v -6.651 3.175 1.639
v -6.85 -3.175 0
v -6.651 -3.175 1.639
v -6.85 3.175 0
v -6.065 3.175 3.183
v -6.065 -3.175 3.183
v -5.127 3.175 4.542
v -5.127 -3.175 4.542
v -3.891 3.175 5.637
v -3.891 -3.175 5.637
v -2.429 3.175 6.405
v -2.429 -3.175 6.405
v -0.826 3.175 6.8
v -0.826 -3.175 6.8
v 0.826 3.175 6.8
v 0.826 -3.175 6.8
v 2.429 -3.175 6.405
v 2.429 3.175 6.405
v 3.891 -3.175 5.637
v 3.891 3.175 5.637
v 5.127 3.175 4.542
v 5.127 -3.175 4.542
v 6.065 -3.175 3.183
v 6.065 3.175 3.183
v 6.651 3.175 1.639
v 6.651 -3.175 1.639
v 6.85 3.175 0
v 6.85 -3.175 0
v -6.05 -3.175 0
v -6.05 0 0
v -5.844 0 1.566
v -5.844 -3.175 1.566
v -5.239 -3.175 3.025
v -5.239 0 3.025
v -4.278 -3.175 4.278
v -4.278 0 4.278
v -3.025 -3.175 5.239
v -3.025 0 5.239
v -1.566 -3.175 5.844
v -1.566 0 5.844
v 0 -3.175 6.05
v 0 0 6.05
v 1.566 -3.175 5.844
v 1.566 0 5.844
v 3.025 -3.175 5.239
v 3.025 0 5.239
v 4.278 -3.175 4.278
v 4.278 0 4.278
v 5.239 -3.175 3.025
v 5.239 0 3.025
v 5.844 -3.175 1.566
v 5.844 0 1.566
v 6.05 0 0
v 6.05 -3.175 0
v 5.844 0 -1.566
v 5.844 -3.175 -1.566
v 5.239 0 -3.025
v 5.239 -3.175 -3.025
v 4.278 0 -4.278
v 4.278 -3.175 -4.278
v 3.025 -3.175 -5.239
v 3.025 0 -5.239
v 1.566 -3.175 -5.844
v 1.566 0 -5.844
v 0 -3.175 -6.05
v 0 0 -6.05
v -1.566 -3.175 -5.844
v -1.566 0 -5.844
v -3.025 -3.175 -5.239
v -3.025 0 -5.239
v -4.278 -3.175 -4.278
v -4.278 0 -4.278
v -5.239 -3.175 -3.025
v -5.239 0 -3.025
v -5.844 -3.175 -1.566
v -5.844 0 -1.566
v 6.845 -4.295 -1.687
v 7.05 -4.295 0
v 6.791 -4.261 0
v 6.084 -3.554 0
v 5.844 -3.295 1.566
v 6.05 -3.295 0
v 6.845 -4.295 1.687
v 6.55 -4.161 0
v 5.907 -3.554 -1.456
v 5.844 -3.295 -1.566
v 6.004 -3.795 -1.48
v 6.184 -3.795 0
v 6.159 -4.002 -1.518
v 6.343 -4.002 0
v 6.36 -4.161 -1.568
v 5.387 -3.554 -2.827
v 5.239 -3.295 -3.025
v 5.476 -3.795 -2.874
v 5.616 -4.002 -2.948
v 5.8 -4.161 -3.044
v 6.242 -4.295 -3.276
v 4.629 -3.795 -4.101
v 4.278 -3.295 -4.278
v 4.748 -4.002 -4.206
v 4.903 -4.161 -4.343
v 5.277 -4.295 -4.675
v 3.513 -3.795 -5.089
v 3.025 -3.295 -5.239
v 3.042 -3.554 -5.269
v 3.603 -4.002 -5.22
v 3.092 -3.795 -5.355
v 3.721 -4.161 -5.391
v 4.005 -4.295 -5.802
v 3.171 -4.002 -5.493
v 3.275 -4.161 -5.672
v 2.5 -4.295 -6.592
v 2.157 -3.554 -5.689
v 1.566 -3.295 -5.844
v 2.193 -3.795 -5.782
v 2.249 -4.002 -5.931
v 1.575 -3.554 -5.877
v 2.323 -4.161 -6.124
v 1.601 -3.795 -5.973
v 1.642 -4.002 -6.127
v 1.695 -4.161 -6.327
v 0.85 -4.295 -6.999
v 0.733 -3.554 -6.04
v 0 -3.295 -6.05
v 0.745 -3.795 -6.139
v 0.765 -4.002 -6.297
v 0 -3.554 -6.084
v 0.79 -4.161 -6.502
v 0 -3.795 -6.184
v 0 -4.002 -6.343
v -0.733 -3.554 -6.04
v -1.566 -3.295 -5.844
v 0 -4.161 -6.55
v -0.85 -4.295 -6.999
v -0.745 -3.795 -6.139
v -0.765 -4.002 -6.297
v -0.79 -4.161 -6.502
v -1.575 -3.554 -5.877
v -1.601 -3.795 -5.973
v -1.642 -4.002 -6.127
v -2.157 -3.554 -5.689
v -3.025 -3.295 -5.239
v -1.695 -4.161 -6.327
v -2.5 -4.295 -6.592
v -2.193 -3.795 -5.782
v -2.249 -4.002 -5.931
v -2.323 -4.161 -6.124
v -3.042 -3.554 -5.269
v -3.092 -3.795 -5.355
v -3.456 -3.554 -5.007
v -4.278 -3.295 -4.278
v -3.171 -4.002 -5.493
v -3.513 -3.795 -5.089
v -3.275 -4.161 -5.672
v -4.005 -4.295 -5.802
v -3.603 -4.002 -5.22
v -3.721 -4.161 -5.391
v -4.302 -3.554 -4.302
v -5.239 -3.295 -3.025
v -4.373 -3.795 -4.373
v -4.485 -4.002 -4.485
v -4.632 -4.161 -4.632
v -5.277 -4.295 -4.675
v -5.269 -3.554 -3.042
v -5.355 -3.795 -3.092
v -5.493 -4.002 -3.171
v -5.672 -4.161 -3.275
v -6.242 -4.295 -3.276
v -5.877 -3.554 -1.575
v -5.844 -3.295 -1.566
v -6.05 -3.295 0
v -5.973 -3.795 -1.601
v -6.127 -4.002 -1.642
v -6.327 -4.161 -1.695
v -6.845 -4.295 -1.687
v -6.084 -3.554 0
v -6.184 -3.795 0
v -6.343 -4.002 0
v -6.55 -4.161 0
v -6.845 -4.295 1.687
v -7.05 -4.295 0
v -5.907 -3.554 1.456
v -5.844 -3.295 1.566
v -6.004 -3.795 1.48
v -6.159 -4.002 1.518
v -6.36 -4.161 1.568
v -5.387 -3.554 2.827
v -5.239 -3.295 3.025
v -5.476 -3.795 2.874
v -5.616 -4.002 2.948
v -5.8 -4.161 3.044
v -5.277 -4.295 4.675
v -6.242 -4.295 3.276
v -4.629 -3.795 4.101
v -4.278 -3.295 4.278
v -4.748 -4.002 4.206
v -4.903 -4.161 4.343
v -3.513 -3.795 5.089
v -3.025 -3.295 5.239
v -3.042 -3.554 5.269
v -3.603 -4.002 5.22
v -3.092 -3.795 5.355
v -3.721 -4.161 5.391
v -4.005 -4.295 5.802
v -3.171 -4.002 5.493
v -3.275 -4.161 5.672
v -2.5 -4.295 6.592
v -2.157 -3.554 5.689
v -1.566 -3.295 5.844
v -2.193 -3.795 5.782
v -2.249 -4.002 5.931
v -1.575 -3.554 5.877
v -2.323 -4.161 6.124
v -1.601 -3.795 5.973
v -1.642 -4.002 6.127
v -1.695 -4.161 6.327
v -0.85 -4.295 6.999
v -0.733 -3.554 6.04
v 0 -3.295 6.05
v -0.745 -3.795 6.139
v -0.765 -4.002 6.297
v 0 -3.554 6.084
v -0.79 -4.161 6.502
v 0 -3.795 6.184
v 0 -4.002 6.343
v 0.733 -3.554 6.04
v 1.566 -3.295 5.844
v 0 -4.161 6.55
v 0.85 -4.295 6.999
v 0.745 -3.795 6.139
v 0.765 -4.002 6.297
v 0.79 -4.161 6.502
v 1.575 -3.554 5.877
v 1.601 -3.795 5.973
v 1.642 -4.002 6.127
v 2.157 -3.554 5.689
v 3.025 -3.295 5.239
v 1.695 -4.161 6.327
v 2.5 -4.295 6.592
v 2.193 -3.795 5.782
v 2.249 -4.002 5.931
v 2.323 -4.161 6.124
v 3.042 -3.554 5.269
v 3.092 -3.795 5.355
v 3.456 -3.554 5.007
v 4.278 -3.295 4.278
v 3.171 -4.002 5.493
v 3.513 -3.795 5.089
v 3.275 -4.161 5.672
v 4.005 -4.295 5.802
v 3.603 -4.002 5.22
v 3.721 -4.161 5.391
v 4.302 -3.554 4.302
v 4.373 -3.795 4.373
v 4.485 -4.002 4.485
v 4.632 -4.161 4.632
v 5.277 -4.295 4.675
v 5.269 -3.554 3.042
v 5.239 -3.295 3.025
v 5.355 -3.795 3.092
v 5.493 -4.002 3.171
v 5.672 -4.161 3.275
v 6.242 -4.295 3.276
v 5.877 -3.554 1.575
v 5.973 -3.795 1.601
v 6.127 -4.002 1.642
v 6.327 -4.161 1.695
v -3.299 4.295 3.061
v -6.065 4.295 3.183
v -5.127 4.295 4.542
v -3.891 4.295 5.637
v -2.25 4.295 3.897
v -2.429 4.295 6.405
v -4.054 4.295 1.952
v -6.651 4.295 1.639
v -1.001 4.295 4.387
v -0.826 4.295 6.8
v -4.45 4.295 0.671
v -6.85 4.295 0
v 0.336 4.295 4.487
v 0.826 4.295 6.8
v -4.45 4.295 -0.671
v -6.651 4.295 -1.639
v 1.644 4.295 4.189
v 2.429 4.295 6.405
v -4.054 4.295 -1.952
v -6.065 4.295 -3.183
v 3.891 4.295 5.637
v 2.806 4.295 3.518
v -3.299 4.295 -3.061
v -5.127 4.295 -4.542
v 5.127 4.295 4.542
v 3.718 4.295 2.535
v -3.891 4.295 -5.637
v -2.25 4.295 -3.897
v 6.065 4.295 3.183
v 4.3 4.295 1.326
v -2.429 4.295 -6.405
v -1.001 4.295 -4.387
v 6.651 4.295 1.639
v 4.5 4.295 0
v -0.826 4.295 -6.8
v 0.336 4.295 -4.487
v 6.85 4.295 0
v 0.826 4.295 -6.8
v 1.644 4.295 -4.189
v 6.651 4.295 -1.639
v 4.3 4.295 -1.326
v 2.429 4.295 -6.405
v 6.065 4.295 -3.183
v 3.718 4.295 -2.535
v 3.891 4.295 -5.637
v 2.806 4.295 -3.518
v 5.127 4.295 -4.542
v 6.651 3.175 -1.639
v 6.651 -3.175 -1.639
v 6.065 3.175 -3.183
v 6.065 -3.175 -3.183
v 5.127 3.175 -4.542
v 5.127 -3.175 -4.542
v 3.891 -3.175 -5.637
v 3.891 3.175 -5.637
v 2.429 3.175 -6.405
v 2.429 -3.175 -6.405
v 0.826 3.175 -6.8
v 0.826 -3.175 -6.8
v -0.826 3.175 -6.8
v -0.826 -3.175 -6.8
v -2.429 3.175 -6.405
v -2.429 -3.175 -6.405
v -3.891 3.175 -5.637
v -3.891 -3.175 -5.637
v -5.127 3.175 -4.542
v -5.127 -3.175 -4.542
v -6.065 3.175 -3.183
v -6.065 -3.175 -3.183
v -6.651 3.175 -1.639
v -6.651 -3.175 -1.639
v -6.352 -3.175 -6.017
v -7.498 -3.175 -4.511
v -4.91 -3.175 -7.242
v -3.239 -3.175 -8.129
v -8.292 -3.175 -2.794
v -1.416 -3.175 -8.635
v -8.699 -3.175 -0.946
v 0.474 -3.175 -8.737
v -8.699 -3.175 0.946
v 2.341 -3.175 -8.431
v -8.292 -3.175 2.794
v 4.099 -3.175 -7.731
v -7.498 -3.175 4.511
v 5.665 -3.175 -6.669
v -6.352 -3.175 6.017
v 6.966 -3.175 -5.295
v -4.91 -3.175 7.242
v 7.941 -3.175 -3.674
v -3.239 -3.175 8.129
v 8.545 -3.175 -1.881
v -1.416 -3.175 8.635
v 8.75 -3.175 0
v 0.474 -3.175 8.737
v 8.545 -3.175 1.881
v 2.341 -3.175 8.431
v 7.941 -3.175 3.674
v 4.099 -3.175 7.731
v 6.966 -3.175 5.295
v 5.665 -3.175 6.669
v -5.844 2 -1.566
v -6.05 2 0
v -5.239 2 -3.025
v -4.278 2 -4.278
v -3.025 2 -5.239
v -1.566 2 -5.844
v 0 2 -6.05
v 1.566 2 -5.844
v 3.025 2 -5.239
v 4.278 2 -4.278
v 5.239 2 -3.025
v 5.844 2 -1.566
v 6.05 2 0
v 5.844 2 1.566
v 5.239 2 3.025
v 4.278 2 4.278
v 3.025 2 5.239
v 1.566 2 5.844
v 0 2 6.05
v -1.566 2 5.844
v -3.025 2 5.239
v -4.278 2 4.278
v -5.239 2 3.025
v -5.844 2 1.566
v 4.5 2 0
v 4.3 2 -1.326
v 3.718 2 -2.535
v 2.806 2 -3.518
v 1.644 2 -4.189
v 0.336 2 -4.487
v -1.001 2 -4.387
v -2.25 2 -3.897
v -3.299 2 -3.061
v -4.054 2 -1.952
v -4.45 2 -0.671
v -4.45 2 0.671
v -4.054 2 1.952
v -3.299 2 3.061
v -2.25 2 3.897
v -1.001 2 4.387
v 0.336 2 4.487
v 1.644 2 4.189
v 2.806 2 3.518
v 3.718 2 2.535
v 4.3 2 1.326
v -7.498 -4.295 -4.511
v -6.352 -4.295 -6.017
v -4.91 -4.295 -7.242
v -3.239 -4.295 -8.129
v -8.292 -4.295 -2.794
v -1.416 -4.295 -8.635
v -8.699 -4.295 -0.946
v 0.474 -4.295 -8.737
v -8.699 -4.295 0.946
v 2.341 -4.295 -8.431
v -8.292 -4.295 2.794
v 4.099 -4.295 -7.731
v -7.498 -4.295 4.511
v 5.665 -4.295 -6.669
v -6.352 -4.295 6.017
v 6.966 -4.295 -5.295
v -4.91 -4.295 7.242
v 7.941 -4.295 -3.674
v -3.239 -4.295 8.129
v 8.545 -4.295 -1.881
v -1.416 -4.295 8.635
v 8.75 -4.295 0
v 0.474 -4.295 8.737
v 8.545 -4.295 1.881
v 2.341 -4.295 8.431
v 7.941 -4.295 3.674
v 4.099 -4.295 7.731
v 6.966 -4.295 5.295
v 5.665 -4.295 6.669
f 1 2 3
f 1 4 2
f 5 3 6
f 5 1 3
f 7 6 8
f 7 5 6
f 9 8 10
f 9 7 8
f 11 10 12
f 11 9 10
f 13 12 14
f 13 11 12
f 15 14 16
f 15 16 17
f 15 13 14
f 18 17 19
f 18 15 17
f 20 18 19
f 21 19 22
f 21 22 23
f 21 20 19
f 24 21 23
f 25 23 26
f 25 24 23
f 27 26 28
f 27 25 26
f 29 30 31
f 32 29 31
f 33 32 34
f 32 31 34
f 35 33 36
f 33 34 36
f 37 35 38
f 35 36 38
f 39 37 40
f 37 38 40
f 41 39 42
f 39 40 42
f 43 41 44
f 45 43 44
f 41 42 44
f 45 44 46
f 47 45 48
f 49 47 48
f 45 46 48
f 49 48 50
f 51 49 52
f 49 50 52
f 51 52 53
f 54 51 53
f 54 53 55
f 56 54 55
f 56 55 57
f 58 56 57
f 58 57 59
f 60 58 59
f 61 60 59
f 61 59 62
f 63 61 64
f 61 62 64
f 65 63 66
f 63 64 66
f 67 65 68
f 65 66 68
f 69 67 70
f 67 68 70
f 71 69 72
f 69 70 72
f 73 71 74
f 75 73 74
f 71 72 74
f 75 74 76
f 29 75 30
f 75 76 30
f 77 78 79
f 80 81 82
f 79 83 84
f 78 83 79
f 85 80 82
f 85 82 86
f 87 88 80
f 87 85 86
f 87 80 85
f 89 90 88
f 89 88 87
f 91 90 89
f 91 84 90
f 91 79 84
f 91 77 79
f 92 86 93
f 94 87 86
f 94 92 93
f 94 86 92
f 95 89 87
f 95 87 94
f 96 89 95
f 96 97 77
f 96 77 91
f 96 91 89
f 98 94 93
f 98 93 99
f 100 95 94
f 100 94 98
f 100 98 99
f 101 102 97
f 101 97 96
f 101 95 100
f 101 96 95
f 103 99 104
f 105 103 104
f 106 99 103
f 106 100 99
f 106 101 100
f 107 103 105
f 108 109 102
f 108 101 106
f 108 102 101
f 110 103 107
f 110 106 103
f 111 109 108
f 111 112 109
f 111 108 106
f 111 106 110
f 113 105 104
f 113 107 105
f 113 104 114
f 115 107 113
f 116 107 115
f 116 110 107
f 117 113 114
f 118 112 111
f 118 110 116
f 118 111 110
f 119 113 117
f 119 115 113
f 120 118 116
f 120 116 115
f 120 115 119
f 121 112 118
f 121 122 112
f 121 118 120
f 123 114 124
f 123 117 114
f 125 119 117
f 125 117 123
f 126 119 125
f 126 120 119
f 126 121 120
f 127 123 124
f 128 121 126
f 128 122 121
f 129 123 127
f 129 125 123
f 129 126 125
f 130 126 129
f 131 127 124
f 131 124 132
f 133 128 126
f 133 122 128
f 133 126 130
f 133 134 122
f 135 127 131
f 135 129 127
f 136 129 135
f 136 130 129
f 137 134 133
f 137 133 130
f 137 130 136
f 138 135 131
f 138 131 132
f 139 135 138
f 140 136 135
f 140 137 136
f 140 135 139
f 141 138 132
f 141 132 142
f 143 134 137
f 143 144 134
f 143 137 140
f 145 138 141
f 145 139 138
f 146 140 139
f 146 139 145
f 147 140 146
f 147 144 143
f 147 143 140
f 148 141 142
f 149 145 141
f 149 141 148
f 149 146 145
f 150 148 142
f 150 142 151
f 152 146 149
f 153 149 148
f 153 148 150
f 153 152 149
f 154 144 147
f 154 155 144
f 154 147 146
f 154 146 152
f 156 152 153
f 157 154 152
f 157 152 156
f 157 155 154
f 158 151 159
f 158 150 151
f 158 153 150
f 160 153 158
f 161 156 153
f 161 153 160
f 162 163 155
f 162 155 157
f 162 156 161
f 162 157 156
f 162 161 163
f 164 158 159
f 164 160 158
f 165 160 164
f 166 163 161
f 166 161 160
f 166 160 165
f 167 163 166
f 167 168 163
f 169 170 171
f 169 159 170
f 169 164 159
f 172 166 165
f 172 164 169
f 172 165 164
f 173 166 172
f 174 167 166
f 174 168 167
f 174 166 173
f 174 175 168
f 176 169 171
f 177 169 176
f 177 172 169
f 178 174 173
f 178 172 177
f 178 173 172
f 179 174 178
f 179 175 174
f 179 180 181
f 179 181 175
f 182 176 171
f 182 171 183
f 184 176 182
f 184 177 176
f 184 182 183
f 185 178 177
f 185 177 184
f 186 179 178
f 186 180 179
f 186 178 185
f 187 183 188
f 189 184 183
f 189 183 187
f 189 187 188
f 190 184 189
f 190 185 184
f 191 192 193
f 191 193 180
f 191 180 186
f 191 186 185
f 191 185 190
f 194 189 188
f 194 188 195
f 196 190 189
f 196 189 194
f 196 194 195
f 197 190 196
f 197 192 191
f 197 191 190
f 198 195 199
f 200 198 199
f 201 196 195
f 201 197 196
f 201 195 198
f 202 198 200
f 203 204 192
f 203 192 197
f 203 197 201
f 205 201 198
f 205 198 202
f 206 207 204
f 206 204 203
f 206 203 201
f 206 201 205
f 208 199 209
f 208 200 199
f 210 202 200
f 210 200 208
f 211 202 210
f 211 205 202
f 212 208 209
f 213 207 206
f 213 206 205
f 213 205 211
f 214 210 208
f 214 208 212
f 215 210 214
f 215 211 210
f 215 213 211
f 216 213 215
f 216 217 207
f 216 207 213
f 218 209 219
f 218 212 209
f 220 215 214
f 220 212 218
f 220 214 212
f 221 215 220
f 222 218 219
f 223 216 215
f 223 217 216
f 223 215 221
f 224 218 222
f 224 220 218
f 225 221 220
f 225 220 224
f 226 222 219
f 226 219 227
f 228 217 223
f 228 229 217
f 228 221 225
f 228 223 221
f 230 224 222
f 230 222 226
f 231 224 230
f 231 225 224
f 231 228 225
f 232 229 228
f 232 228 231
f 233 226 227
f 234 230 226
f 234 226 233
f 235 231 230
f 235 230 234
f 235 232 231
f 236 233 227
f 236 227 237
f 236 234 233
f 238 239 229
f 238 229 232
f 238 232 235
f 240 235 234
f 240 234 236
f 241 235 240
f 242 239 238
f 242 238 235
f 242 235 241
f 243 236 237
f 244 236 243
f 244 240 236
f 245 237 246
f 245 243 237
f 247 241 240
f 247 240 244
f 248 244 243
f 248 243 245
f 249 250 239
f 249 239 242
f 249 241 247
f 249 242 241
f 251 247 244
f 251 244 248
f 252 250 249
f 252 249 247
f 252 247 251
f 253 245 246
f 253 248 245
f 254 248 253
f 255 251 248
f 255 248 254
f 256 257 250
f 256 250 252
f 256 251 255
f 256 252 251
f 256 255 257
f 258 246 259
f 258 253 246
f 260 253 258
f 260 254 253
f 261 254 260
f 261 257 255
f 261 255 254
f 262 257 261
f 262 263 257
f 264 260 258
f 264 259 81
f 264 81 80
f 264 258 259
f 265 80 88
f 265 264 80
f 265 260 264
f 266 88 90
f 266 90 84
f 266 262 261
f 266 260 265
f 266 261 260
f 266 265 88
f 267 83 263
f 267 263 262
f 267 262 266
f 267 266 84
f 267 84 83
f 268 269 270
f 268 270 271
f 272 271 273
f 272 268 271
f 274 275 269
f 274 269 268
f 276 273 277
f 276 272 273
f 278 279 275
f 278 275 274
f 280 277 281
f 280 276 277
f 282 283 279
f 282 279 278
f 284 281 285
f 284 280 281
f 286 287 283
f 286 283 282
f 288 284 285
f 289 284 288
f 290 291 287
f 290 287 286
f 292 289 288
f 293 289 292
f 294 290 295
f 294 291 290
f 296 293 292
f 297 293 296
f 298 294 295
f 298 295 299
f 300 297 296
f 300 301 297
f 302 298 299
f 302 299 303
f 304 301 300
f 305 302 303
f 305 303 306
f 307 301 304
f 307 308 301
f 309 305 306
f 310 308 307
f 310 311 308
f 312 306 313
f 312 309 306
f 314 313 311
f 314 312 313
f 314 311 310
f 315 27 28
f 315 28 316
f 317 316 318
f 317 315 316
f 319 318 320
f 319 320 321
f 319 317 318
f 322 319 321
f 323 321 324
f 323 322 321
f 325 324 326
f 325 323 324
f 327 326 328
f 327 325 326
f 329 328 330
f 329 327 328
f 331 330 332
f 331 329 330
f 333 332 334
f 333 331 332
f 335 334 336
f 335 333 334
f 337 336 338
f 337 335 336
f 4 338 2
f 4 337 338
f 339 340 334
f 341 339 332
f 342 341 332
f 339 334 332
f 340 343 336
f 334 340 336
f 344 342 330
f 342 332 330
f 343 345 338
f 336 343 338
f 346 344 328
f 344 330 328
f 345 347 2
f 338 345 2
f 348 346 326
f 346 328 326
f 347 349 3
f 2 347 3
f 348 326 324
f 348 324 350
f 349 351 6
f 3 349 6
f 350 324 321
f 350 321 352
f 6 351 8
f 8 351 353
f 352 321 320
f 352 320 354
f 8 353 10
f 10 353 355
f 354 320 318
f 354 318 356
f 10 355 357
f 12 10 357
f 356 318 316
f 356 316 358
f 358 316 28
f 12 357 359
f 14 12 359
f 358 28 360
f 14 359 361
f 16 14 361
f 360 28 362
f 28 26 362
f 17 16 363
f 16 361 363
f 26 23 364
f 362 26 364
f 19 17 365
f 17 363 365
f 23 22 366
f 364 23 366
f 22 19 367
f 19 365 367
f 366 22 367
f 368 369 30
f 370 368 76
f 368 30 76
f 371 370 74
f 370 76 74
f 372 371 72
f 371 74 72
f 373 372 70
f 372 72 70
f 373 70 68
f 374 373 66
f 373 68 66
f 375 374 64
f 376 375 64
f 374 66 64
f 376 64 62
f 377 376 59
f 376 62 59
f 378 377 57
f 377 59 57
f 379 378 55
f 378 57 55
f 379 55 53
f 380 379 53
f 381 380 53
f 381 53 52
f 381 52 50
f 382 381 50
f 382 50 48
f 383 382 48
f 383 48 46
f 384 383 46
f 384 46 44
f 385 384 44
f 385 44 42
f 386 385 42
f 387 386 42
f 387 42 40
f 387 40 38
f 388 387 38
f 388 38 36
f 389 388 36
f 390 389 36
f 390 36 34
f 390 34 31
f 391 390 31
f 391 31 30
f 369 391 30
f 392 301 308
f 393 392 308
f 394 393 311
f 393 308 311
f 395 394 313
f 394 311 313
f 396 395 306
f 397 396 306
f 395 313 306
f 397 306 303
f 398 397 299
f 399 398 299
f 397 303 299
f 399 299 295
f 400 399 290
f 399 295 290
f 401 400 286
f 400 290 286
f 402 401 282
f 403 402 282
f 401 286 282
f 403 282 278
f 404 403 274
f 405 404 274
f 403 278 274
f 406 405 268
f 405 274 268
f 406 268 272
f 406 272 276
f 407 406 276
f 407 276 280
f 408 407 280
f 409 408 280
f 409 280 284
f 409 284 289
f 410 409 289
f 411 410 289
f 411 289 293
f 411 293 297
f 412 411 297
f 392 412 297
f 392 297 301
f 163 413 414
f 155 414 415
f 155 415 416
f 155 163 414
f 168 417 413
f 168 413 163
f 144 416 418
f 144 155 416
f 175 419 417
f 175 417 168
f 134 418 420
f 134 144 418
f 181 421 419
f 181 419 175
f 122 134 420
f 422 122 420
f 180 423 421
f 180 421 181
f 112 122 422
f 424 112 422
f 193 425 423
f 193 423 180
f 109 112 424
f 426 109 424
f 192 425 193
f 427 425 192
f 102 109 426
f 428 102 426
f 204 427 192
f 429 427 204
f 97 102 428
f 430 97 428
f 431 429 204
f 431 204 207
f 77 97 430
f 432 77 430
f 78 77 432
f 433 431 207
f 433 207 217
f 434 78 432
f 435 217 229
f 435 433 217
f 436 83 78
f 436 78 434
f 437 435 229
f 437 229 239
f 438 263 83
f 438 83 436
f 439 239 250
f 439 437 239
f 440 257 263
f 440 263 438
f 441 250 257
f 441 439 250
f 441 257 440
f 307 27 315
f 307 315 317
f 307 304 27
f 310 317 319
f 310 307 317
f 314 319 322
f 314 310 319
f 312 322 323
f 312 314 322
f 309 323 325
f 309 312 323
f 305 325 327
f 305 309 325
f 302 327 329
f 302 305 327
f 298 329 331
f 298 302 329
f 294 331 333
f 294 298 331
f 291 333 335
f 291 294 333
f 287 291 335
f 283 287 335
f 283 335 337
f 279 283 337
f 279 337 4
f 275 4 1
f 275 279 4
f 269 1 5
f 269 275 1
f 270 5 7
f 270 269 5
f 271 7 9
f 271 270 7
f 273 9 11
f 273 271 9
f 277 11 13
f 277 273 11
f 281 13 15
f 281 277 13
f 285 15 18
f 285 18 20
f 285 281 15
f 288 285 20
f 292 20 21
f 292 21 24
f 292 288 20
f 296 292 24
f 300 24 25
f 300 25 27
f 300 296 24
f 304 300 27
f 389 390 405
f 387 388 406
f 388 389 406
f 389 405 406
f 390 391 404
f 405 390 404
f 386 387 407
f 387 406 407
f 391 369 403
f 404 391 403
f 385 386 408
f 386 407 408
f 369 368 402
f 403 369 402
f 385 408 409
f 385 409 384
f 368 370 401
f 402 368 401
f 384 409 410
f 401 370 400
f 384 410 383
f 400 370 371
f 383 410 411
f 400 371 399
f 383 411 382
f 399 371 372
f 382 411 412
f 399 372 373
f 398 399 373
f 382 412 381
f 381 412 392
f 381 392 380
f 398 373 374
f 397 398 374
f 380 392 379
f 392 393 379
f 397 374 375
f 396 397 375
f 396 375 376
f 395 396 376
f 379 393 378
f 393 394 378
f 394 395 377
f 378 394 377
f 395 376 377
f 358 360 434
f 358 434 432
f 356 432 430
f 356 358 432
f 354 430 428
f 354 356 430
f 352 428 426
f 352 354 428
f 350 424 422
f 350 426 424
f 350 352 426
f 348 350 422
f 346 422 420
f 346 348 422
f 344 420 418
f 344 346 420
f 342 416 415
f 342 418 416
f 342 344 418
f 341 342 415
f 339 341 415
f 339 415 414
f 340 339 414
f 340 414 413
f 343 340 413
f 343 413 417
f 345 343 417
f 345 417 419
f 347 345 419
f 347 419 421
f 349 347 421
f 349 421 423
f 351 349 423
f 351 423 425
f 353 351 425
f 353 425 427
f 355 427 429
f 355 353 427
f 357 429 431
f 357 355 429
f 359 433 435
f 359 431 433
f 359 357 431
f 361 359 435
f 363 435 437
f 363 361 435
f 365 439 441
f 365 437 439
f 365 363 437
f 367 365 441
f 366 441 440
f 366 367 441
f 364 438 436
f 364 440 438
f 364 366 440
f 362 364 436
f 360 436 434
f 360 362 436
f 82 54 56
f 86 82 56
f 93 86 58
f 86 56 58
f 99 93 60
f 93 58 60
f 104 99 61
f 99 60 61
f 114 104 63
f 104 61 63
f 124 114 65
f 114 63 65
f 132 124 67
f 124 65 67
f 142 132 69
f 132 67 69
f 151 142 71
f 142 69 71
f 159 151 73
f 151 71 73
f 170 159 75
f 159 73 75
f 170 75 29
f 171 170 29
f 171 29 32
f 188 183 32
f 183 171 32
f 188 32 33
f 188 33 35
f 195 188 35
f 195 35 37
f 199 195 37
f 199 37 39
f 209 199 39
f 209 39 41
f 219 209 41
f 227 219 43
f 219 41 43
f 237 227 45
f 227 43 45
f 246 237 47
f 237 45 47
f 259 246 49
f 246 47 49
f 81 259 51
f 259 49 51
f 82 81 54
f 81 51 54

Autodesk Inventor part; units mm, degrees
ref_plane "YZ Plane" through (0, 0, 0) normal (1, 0, 0) x (0, 1, 0)
ref_plane "XZ Plane" through (0, 0, 0) normal (0, 1, 0) x (-1, 0, 0)
ref_plane "XY Plane" through (0, 0, 0) normal (0, 0, 1) x (1, 0, 0)
sketch "Boceto1" plane through (0, 0, 0) normal (0, 1, 0) x (-1, 0, 0)
  circle A0 centre (0, 0) radius 6.05
  circle A1 centre (0, 0) radius 6.85
  dimension "d0" = 12.1
  dimension "d1" = 0.8
extrude "Extrusión1" add sketch "Boceto1" along normal mid plane 6.35
sketch "Boceto2" plane through (0, 3.175, 0) normal (0, 1, 0) x (1, 0, 0)
  circle A0 centre (0, 0) radius 6.05 projected
  circle A1 centre (0, 0) radius 8.75
  dimension "d4" = 17.5
extrude "Extrusión2" add sketch "Boceto2" along normal blind 1.12
sketch "Boceto3" plane through (0, -3.175, 0) normal (0, -1, 0) x (1, 0, 0)
  circle A0 centre (0, 0) radius 6.05 projected
  circle A1 centre (0, 0) radius 8.75
  circle A2 centre (0, 0) radius 8.75 projected
extrude "Extrusión3" add sketch "Boceto3" along normal blind 1.12
sketch "Boceto4" plane through (0, 4.295, 0) normal (0, 1, 0) x (1, 0, 0)
  circle A0 centre (0, 0) radius 6.05 projected
  circle A1 centre (0, 0) radius 4.5
  dimension "d14" = 9
extrude "Extrusión4" add sketch "Boceto4" against normal blind 2.295
sketch "Boceto6" plane through (0, 3.175, 0) normal (0, -1, 0) x (1, 0, 0)
  circle A0 centre (0, 0) radius 6.85 projected
  circle A1 centre (0, 0) radius 8.53
  circle A2 centre (0, 0) radius 7.78
  dimension "d17" = 1.68
  dimension "d18" = 0.75
fillet "Empalme1" radius 1 1 edges at (-6.05, -4.295, 0)
sketch "Boceto7" plane through (0, 4.295, 0) normal (0, 1, 0) x (1, 0, 0)
  circle A0 centre (0, 0) radius 8.75 projected
  circle A1 centre (0, 0) radius 6.85 projected
  circle A2 centre (0, 0) radius 6.85 projected
extrude "Extrusión6" cut sketch "Boceto7" against normal up to surface (7.47 mm away)
sketch "Boceto5" plane through (0, -4.295, 0) normal (0, -1, 0) x (1, 0, 0)
  circle A0 centre (0, 0) radius 8.75 projected
  circle A1 centre (0, 0) radius 6.85 projected
properties part number "Idle pulley"
